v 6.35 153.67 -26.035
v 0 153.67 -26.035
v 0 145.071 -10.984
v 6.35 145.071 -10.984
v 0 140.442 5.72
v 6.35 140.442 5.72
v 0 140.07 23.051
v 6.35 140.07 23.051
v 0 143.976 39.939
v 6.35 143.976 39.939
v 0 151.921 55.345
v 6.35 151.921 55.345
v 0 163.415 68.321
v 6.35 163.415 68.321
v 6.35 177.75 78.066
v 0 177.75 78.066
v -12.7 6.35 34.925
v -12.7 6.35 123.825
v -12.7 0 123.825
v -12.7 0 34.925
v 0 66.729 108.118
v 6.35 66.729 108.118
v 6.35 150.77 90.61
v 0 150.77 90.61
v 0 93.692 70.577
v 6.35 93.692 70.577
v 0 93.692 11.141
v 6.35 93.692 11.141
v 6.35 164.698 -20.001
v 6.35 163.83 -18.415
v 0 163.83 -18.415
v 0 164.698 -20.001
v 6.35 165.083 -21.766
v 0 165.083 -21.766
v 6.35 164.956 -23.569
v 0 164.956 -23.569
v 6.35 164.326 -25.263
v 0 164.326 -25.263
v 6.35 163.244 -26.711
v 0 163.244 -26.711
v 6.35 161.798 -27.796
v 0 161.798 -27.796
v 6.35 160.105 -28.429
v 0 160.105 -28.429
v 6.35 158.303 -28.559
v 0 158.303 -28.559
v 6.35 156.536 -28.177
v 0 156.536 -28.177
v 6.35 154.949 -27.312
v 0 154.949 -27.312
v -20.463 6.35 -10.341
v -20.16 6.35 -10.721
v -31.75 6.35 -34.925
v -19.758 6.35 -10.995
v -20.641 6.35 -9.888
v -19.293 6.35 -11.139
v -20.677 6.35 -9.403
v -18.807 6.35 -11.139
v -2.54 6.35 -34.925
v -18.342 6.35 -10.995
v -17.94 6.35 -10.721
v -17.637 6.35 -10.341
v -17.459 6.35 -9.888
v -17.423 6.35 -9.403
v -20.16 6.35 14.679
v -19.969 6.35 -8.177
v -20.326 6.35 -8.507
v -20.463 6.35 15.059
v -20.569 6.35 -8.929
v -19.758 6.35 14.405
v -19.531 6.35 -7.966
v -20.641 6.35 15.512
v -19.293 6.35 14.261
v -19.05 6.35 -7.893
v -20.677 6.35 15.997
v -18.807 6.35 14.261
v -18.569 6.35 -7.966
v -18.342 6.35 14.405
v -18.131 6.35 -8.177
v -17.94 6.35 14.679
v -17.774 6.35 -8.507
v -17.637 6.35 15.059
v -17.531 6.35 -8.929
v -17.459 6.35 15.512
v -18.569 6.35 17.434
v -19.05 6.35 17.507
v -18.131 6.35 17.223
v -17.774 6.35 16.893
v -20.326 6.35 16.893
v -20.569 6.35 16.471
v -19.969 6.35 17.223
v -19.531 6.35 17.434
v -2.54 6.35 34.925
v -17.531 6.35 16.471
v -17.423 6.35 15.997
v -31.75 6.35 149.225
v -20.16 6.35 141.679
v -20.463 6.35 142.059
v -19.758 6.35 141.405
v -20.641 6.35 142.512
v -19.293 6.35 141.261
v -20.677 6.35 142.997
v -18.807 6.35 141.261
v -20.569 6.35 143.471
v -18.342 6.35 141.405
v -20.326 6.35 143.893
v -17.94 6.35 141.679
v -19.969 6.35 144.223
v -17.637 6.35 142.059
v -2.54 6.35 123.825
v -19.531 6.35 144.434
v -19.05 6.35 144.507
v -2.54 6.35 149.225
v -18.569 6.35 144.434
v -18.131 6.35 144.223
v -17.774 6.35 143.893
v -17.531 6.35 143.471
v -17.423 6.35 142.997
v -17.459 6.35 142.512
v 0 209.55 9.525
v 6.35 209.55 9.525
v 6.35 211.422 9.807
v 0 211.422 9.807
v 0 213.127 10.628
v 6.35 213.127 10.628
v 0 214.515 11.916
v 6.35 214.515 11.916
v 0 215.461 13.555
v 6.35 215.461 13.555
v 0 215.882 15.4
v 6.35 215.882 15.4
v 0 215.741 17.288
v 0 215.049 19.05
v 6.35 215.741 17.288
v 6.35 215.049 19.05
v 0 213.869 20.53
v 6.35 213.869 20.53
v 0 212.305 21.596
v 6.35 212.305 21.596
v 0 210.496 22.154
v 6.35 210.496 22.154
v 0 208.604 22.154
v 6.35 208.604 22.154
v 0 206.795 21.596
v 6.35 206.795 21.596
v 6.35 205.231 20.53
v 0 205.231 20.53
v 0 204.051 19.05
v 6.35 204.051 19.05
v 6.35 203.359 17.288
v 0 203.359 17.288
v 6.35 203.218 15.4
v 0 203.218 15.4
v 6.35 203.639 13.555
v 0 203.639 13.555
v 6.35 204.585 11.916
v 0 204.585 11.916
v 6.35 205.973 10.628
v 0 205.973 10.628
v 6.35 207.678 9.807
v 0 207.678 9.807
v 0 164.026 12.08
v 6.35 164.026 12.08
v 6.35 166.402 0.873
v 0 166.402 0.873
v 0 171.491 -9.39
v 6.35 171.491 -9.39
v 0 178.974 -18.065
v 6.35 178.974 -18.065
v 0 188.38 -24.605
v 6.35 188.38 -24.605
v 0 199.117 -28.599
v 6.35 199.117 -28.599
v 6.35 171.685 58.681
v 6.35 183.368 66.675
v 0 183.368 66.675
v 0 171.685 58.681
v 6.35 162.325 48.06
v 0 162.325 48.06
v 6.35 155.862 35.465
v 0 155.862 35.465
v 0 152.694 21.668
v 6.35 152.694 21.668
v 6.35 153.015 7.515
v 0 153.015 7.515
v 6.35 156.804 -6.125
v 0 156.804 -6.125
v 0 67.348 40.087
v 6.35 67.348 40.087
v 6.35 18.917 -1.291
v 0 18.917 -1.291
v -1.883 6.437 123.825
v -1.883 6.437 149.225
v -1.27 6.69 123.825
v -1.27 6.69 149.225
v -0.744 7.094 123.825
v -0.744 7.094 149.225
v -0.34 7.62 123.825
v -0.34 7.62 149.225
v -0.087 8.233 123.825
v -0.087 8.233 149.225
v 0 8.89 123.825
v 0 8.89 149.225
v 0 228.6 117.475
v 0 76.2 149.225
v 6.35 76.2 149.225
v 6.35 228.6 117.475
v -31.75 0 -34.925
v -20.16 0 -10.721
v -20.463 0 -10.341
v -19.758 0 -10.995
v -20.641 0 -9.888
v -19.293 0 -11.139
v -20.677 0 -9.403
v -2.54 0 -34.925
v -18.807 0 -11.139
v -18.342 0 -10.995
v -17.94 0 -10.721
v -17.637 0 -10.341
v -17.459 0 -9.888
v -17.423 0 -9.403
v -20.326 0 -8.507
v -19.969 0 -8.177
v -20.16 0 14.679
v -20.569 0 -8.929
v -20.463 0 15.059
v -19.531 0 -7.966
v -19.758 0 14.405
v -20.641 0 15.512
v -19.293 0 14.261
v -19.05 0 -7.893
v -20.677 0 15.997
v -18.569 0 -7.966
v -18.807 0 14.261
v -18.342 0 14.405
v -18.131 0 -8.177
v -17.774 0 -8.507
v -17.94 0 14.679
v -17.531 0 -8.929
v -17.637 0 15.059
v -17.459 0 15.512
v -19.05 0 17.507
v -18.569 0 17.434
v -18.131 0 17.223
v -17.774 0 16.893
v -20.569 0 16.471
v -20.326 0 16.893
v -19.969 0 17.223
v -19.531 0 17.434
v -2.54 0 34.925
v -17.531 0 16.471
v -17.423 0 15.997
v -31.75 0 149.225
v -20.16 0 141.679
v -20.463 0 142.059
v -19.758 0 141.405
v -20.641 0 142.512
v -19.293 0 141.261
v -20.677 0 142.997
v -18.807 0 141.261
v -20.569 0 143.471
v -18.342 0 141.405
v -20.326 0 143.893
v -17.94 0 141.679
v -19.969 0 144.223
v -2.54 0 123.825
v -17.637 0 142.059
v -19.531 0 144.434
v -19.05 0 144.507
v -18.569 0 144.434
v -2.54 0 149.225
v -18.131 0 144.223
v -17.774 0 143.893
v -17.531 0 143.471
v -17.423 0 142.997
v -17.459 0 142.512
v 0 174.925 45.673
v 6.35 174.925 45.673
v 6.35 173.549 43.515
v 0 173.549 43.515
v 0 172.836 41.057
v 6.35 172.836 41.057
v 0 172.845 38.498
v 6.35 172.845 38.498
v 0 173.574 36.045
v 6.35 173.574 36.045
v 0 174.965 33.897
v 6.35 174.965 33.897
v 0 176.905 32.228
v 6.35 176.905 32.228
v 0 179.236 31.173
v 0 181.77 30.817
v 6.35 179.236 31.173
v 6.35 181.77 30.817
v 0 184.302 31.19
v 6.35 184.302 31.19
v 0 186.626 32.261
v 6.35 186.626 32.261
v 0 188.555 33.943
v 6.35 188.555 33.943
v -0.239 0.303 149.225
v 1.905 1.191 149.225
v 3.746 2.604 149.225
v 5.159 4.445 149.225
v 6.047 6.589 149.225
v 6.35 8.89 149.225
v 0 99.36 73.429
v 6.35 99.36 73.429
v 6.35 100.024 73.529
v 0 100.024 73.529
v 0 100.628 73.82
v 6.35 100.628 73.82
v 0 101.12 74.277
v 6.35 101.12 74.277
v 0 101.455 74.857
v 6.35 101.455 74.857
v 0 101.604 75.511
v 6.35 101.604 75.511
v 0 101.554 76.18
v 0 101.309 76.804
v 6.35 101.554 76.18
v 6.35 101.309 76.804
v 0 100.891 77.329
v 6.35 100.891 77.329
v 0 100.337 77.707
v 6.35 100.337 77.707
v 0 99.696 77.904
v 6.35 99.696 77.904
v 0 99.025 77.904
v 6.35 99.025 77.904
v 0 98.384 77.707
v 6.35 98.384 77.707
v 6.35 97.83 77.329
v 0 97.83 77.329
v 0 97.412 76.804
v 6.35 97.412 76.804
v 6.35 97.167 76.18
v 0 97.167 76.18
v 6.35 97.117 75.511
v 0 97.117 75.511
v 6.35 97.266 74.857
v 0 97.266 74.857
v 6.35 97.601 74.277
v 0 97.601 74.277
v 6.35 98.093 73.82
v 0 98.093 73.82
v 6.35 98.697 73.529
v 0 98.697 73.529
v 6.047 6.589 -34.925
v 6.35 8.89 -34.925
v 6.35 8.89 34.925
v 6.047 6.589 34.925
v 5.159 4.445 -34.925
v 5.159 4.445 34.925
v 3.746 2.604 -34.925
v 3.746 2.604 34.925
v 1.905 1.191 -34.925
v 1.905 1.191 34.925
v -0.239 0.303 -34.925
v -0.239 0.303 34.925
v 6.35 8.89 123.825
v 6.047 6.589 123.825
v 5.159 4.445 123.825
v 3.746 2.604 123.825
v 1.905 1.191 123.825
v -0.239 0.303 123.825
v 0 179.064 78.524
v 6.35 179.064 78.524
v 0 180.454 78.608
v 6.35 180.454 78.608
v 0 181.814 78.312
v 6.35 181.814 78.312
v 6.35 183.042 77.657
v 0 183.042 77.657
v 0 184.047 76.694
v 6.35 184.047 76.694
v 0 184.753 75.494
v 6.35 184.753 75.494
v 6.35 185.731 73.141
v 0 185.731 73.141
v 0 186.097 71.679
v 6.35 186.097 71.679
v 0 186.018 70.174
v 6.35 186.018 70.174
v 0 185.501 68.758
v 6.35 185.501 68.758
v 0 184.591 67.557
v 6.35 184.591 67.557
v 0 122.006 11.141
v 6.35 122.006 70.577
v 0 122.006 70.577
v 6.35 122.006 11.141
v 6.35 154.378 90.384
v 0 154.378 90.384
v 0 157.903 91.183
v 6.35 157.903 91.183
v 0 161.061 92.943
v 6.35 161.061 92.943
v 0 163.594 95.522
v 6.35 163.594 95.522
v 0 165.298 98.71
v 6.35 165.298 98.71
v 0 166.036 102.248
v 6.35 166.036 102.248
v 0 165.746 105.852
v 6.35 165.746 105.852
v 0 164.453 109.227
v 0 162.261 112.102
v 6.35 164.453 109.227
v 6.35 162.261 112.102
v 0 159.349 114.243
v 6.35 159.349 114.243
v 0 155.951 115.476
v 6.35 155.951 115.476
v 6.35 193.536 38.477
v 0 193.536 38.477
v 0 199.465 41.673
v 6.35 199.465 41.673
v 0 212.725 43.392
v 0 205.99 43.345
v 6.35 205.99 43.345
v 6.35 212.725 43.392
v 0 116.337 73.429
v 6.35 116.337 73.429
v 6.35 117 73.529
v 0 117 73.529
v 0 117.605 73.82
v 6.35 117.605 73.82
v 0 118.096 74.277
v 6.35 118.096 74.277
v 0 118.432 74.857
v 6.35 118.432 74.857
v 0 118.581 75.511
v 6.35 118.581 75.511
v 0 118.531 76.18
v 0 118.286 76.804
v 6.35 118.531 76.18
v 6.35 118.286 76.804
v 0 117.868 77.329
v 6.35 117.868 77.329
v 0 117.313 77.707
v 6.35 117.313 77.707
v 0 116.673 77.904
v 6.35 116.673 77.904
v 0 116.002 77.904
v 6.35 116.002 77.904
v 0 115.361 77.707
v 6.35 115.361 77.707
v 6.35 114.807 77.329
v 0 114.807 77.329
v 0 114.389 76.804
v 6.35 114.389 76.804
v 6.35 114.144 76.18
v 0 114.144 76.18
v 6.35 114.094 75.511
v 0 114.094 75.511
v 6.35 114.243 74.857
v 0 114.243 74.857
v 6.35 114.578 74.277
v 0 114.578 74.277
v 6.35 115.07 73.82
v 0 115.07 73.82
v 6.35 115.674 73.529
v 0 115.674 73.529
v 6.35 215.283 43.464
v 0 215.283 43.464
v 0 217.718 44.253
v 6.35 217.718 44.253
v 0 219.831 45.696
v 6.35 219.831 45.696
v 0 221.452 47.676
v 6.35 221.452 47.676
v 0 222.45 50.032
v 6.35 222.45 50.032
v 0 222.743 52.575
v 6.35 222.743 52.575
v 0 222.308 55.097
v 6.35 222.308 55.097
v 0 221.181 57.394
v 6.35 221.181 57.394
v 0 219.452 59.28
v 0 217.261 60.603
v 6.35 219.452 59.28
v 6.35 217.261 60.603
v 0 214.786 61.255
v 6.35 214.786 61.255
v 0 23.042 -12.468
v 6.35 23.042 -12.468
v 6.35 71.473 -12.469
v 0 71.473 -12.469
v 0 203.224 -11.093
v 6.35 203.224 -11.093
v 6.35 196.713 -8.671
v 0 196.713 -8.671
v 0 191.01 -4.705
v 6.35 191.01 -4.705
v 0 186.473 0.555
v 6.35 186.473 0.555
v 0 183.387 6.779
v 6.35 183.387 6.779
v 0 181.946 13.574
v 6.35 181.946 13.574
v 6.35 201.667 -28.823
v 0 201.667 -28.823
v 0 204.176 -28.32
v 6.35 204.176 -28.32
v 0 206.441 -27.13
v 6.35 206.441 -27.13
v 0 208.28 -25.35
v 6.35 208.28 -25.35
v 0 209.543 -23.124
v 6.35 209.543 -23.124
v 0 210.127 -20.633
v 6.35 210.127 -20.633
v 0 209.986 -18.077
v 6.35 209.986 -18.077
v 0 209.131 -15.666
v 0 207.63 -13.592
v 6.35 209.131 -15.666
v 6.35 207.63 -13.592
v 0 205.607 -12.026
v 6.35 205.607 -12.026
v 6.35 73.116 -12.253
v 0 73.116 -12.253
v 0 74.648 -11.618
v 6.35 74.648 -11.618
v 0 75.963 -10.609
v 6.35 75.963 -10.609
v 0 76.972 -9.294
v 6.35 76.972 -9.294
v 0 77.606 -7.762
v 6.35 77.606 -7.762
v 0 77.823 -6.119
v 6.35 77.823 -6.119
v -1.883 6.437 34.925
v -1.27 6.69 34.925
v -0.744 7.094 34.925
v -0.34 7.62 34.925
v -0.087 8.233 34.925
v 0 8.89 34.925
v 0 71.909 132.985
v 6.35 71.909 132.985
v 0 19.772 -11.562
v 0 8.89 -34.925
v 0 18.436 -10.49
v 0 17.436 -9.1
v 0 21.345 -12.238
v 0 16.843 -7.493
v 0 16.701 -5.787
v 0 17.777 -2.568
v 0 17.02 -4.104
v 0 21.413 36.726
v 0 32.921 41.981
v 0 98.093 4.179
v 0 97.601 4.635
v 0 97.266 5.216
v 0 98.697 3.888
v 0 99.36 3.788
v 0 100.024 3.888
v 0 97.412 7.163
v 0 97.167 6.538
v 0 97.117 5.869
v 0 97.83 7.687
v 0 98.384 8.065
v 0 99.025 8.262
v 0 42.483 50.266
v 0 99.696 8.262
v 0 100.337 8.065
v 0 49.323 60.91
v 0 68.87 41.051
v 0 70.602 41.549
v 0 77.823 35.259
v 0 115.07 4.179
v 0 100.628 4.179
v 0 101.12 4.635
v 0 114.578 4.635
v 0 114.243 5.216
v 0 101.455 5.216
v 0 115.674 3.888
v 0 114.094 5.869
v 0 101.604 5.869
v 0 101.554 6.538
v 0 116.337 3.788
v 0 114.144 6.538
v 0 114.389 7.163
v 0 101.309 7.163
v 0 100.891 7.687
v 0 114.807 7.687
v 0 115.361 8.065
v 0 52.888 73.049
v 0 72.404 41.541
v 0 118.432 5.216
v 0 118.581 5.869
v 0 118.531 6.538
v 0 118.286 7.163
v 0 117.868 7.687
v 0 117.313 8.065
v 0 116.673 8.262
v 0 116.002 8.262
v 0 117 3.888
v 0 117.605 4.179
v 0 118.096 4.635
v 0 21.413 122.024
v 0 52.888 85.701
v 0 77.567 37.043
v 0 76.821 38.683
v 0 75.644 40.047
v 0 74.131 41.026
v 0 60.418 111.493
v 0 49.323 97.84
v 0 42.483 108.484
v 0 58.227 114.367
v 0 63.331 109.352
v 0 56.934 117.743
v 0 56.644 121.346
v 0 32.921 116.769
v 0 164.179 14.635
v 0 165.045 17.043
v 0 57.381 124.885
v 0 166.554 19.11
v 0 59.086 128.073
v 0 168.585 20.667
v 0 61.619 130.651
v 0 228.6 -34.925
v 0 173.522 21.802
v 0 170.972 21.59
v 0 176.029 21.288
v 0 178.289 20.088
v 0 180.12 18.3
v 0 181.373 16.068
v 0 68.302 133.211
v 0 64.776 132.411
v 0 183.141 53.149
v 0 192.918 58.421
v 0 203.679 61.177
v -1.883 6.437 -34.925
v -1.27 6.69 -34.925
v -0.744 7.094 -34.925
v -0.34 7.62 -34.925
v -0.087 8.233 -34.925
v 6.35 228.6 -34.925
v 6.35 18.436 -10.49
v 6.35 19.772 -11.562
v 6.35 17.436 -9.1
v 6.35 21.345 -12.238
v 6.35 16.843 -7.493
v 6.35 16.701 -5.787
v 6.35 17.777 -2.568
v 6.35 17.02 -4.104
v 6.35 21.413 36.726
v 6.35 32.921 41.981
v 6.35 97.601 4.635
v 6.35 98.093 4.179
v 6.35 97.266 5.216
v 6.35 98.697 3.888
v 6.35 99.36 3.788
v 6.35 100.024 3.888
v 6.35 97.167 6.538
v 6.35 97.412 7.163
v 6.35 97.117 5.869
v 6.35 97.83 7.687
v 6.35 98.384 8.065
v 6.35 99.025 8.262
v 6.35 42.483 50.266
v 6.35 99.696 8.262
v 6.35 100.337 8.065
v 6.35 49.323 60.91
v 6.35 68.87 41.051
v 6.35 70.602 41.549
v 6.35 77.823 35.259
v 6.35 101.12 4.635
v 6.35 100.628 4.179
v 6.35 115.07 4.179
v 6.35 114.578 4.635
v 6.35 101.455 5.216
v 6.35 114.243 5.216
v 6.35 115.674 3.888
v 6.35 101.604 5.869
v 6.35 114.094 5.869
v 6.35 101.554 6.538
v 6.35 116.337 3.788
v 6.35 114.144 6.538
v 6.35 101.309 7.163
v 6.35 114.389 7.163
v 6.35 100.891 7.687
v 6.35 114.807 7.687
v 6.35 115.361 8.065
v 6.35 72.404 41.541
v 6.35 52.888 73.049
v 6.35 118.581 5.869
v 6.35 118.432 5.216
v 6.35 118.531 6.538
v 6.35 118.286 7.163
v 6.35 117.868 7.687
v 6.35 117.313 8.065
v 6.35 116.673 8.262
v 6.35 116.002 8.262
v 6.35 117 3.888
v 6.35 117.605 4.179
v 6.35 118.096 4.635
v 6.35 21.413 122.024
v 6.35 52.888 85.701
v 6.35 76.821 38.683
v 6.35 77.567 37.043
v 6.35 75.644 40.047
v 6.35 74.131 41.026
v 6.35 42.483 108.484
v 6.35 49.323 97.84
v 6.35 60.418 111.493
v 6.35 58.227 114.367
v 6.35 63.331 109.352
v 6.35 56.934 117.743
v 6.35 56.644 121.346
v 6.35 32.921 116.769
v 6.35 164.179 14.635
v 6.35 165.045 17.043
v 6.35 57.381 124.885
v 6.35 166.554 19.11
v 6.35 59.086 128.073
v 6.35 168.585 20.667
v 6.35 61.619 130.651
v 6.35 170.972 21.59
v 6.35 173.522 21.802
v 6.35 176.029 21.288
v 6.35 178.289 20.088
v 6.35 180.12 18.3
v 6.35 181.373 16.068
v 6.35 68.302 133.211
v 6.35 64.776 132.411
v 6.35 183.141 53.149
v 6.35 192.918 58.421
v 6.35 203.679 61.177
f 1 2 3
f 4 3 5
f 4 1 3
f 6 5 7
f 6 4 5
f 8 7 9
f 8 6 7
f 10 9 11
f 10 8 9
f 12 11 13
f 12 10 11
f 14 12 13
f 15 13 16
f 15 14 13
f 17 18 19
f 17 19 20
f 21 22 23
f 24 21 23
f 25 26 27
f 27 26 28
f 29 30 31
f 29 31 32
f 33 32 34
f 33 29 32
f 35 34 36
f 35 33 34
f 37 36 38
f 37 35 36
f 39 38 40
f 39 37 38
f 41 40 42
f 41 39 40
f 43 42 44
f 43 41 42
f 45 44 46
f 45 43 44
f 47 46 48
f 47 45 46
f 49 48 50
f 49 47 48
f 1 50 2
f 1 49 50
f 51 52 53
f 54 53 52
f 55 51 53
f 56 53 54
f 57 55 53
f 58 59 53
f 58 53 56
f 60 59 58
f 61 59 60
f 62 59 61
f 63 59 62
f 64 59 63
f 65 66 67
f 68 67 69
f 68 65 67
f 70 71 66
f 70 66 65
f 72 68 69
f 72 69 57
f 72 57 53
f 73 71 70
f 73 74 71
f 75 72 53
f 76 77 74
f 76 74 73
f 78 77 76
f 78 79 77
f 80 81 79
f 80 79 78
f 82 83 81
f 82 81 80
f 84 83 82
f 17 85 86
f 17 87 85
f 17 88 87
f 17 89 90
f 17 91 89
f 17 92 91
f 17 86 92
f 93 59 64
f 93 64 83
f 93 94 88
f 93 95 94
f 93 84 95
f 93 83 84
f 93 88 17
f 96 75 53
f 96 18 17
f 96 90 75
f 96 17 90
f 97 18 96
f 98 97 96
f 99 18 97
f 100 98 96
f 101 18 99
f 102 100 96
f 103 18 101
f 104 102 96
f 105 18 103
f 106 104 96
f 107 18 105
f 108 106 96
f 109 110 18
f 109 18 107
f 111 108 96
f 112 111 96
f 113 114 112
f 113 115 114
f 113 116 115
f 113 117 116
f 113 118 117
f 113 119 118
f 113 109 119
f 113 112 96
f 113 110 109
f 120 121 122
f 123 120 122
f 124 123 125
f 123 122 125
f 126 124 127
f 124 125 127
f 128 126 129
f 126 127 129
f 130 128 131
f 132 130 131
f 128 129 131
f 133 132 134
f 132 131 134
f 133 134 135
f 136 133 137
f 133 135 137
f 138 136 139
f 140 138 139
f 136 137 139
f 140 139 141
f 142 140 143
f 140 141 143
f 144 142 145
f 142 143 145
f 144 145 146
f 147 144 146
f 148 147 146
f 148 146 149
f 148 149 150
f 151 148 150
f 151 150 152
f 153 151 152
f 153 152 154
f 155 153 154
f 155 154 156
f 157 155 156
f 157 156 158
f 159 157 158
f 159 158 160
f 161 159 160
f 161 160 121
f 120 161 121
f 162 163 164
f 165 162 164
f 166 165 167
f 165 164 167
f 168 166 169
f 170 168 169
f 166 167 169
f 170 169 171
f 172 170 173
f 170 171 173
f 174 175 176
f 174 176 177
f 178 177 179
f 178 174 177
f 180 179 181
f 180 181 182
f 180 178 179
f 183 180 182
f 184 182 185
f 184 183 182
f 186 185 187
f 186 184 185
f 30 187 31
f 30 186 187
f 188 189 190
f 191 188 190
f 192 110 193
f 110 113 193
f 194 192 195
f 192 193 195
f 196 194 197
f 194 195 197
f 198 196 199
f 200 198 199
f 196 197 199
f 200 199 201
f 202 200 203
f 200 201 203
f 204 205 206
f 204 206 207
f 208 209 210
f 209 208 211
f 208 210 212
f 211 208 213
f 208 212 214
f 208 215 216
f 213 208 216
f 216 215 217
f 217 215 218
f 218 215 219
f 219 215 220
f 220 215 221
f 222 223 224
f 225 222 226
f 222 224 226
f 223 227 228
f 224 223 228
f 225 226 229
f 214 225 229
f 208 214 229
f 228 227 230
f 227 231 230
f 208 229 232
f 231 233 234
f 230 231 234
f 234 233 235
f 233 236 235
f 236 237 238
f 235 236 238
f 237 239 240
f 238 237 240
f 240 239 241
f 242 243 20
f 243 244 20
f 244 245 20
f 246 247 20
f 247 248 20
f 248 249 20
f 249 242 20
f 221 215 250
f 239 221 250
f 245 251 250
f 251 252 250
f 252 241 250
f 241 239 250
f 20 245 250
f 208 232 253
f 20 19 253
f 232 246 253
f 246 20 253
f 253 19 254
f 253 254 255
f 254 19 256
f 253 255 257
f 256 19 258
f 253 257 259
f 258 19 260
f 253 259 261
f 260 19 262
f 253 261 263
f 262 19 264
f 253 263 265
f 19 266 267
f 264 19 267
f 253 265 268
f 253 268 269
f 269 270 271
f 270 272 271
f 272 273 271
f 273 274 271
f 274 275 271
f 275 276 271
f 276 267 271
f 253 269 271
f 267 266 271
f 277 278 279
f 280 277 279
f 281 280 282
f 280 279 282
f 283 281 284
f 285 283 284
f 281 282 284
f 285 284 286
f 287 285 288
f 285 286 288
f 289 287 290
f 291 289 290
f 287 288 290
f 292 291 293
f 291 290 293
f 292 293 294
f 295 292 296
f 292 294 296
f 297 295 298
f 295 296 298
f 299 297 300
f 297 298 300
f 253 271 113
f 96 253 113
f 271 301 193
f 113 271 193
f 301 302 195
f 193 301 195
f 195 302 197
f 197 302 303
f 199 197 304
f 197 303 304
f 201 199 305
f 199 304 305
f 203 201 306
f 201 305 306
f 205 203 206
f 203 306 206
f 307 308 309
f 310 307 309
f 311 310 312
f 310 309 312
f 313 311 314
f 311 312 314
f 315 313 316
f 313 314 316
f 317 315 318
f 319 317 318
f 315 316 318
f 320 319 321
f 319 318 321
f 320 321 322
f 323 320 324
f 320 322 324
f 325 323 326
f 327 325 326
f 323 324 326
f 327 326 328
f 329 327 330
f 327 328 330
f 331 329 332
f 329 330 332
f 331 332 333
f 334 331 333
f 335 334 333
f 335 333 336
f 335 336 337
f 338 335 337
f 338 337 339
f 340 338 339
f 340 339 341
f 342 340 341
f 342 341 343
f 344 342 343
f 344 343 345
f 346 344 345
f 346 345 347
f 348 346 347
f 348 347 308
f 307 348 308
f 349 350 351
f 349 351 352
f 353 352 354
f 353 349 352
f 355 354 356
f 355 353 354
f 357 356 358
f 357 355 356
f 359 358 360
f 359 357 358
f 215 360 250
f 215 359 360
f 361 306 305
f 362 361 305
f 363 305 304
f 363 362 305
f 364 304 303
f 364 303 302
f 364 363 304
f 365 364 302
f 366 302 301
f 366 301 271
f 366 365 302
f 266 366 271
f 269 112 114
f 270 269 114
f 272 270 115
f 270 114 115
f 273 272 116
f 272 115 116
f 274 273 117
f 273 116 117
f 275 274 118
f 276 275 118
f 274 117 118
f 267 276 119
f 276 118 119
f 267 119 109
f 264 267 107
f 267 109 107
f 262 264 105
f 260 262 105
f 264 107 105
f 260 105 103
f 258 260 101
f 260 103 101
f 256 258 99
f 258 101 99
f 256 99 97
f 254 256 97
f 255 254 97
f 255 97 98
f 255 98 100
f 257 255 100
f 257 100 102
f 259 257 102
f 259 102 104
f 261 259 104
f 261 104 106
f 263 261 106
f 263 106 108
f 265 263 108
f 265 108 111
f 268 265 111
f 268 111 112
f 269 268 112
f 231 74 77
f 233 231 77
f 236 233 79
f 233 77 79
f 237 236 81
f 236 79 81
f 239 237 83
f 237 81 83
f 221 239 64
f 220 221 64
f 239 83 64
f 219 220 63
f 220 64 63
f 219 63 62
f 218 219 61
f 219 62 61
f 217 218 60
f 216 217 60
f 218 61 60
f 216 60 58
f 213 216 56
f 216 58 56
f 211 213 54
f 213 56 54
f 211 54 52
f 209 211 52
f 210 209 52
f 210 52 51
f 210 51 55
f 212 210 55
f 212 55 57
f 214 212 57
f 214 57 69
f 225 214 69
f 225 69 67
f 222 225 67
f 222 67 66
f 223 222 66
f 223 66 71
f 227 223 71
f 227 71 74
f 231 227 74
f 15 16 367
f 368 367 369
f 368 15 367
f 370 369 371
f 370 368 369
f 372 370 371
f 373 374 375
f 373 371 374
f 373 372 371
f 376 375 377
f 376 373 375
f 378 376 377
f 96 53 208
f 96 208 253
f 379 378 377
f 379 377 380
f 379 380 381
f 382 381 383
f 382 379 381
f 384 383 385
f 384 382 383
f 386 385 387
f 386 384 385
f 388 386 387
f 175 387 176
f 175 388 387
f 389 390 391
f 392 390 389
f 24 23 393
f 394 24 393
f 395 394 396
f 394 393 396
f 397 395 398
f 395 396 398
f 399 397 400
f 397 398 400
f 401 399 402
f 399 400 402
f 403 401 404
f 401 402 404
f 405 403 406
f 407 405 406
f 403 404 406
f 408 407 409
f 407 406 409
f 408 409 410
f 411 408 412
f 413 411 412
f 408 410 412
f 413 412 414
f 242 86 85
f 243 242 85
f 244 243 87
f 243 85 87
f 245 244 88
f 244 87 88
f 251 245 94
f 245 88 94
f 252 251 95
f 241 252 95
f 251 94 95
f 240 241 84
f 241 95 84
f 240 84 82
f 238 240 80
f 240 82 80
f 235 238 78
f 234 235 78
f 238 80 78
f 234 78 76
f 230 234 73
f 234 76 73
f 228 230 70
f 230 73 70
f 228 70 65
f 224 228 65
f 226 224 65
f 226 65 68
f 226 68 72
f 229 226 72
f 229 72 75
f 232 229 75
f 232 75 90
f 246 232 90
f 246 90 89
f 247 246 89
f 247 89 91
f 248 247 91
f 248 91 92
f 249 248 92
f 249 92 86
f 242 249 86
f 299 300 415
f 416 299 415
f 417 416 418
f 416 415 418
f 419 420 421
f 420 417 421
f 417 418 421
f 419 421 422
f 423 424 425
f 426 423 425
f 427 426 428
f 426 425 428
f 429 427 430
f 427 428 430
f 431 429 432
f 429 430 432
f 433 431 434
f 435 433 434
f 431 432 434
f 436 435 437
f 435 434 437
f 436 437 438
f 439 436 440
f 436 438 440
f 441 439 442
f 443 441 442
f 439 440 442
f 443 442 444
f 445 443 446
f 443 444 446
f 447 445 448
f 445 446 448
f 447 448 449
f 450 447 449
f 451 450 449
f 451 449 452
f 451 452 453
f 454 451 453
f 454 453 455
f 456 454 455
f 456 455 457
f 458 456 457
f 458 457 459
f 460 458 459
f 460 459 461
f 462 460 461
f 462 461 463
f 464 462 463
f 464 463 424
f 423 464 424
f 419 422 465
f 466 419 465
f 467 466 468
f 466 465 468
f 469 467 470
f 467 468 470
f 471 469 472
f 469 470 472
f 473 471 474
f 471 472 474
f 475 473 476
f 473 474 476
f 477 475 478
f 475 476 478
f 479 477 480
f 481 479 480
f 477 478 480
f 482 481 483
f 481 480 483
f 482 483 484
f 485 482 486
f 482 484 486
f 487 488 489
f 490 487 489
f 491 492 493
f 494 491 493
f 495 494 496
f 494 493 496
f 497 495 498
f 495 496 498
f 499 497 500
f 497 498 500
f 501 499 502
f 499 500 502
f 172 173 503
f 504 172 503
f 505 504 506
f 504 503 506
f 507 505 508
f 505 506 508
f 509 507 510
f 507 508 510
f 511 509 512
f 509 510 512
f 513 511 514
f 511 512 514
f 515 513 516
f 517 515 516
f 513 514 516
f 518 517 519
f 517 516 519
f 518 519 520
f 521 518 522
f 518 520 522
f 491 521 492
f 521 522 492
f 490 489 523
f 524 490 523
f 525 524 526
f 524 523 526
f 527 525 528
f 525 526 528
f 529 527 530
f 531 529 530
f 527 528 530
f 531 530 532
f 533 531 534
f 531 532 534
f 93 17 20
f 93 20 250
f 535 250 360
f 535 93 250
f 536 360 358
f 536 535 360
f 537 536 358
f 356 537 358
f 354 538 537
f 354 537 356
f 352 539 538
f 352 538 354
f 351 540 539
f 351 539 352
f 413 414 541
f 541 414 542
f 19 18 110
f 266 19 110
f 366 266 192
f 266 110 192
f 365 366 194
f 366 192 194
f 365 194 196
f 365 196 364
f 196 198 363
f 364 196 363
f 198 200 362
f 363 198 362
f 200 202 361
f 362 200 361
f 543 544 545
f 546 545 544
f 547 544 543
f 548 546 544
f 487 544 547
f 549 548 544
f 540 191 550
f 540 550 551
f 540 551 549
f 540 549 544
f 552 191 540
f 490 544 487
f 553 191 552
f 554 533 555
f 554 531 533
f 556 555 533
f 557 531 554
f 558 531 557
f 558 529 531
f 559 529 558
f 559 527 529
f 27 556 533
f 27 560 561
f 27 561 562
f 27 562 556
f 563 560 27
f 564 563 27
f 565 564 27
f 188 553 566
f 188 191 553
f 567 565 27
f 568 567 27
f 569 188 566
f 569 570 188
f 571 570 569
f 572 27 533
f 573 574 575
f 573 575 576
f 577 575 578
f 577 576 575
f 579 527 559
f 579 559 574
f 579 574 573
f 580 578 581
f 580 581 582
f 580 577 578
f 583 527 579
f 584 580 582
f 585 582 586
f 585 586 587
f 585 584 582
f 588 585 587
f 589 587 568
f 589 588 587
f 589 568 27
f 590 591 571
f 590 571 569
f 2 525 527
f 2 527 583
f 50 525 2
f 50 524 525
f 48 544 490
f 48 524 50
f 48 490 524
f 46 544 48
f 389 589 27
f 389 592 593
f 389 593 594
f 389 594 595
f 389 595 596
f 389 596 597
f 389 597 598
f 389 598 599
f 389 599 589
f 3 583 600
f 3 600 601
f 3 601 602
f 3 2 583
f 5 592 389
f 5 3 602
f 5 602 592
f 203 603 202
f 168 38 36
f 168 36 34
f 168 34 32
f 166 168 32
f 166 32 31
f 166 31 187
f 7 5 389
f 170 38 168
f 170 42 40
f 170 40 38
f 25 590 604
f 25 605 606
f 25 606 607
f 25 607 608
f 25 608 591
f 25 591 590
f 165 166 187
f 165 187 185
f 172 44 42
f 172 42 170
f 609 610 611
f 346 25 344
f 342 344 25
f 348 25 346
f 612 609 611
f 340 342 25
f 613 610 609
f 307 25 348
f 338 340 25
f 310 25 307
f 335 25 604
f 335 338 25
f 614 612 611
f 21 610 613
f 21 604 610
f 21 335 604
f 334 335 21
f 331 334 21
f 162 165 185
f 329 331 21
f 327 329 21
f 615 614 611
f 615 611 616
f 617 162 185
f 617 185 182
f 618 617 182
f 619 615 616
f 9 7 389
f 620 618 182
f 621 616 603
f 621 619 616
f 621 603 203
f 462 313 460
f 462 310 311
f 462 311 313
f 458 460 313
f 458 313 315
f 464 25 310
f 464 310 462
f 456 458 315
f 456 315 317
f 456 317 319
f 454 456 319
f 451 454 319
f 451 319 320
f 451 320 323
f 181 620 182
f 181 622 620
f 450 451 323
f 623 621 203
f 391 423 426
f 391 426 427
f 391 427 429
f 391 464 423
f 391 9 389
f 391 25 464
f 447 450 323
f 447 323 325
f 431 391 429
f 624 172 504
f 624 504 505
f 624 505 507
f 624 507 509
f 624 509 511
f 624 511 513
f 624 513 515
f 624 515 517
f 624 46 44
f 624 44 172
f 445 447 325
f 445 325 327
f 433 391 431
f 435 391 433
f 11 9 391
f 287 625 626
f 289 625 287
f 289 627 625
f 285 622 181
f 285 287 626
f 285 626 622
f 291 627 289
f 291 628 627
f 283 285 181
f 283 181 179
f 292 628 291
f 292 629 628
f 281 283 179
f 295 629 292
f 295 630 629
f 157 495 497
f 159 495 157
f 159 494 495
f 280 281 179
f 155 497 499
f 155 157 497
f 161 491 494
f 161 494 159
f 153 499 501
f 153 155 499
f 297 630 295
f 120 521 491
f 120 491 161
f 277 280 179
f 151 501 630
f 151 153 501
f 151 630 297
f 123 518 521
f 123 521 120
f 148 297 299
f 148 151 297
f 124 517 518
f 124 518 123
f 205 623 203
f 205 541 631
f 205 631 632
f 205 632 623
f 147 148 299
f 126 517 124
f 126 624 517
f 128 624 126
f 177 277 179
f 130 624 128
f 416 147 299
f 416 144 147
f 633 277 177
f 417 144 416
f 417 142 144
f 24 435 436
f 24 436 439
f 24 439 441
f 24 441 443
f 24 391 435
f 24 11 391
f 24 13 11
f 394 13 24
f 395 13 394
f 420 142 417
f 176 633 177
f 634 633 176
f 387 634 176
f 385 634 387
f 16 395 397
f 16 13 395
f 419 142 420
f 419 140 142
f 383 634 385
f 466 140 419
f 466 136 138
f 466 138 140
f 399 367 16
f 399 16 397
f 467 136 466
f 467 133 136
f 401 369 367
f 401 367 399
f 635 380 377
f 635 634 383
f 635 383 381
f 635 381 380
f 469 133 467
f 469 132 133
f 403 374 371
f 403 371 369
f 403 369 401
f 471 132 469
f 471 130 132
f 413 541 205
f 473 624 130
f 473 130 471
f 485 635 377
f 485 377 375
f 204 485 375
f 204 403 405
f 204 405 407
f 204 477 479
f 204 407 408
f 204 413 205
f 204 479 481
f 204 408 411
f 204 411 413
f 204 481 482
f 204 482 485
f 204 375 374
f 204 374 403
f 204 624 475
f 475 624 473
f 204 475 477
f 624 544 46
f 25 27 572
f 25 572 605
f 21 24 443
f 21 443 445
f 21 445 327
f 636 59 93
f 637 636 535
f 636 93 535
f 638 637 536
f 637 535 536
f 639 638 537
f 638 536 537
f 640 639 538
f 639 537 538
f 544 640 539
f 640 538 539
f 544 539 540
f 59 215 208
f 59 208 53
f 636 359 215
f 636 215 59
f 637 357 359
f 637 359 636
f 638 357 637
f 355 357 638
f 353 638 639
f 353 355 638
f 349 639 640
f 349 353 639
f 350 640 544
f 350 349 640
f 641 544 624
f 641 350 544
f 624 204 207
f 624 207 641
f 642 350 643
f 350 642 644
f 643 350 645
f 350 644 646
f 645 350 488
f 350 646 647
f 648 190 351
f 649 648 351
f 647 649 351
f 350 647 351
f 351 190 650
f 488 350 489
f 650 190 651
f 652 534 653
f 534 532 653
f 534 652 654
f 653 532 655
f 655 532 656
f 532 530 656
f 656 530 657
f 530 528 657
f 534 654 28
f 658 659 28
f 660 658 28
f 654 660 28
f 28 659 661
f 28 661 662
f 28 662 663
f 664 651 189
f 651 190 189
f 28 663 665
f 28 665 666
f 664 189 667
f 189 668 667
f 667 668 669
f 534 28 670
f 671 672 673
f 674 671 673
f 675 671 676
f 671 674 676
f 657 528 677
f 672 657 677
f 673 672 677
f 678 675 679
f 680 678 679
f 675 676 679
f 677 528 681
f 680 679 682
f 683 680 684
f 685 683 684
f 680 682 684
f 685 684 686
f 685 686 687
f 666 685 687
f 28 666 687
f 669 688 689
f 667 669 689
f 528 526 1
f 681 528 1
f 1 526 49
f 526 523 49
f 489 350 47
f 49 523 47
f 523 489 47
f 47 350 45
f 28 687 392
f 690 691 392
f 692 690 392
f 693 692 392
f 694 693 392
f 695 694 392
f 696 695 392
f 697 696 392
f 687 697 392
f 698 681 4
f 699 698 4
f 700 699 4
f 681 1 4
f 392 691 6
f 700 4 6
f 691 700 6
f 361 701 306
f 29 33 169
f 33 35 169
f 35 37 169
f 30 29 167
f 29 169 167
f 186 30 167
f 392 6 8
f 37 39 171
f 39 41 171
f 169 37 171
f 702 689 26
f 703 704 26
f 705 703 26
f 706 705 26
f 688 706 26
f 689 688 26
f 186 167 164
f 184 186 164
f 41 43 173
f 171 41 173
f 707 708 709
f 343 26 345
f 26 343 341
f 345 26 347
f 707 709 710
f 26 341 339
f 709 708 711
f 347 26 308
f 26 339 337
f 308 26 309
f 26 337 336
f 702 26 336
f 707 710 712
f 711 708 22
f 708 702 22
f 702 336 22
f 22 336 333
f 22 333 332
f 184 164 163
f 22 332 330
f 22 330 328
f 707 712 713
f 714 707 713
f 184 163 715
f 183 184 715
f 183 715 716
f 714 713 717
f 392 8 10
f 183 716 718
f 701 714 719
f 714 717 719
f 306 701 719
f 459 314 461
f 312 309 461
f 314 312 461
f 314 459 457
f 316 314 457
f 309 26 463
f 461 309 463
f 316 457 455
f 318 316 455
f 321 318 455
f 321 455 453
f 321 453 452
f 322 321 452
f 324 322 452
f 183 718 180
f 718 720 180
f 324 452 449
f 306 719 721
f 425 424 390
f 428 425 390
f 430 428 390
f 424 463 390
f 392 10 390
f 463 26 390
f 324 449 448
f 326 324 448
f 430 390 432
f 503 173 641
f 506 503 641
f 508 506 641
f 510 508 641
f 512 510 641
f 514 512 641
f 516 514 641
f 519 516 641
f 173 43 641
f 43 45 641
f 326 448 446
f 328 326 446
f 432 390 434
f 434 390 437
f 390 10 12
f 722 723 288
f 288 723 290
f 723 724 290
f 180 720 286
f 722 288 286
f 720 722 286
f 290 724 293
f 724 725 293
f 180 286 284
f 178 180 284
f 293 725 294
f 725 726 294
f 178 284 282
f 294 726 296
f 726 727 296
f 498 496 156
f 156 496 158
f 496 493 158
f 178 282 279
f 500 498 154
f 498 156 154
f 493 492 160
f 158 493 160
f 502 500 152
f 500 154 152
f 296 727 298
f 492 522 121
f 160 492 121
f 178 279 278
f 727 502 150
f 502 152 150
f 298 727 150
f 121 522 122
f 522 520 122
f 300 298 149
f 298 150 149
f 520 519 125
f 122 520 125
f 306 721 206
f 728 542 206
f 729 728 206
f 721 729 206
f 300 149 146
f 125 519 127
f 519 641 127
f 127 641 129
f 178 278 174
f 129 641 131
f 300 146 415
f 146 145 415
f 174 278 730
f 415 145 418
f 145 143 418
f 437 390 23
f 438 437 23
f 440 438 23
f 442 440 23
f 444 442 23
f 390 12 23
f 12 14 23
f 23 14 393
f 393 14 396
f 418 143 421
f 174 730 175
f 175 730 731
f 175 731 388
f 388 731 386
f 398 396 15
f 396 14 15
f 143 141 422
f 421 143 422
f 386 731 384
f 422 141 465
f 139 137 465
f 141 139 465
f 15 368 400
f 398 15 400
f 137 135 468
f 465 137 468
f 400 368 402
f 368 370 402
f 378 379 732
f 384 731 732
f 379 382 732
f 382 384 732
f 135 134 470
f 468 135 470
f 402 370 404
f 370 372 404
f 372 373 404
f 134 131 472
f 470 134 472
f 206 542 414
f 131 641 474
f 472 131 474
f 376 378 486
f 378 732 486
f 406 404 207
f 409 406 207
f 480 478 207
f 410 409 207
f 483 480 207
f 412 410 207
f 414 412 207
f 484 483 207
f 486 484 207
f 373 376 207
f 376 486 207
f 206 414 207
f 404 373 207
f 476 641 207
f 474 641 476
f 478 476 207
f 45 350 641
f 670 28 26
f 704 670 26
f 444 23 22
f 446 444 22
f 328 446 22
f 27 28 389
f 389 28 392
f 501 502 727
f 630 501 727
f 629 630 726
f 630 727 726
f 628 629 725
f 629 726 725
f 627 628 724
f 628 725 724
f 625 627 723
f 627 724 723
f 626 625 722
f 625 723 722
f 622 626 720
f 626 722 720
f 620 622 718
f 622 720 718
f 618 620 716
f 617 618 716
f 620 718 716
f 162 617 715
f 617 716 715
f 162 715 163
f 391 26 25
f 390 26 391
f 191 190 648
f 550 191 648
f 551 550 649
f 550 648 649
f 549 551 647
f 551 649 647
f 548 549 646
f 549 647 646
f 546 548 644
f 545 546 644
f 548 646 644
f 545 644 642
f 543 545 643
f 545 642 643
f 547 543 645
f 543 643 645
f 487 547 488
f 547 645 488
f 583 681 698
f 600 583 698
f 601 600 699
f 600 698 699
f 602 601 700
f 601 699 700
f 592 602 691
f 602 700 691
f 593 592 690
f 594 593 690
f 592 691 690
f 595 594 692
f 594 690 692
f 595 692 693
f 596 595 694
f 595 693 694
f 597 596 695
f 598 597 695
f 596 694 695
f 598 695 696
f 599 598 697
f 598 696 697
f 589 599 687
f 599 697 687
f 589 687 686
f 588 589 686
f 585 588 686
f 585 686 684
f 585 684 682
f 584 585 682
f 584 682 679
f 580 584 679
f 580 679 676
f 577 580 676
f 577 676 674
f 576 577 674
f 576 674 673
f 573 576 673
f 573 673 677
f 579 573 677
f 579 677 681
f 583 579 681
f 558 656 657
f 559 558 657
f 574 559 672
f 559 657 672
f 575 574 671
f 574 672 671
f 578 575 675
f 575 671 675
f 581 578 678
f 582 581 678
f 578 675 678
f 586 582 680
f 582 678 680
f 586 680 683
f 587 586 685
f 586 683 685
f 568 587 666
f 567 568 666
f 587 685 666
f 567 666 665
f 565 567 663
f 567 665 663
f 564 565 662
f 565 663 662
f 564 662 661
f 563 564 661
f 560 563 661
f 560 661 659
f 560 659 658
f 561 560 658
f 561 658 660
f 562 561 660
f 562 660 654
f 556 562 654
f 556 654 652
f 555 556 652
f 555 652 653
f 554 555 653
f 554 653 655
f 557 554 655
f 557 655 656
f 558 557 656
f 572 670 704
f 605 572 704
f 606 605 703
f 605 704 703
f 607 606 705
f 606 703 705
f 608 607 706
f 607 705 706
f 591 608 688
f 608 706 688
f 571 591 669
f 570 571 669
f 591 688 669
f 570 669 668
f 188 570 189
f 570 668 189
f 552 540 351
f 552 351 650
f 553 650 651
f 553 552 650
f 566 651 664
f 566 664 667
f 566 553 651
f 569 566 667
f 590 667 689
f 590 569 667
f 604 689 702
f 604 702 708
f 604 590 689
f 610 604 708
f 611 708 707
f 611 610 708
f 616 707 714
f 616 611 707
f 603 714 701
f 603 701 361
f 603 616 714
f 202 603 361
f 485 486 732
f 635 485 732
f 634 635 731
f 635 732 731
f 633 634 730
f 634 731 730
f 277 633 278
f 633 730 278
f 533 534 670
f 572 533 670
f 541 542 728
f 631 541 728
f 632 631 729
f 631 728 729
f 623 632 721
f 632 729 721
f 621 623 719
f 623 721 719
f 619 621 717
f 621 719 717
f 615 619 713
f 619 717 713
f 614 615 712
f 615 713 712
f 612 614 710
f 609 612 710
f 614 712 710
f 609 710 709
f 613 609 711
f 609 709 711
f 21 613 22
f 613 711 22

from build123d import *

# Parameters (mm, degrees)
BOSS_EXTRUDE1_DEPTH  = 6.35
SKETCH5_W            = 184.15
SKETCH5_H            = 6.35
BOSS_EXTRUDE4_DEPTH  = 31.75
SKETCH6_W            = 12.7
SKETCH6_H            = 88.9
CUT_EXTRUDE2_DEPTH   = 270.576010849
CUT_EXTRUDE3_REACH   = 277.64
SKETCH7_R            = 2.25
SKETCH7_W            = 59.436
SKETCH7_H            = 28.313784743
SKETCH8_R            = 6.35
CUT_EXTRUDE4_DEPTH   = 276.640473489
FILLET1_R            = 2.54
CONVERT_SOLID1_START = -34.925
CONVERT_SOLID1_DEPTH = 184.15
CUT_EXTRUDE5_REACH   = 277.64
CUT_EXTRUDE6_REACH   = 271.576
SKETCH10_R           = 1.63195


# Read off the part's stored shape, not the designer's step: Convert-Solid1
with BuildPart() as part:
    # Sketch1 → Boss-Extrude1 (new body)
    with BuildSketch(Plane(origin=(0, 0, 0), x_dir=(0, 0, -1), z_dir=(1, 0, 0))):
        with BuildLine():
            Line((-117.475, 228.6), (34.925, 228.6))
            Line((34.925, 228.6), (34.925, 8.89))
            Line((34.925, 8.89), (34.925, 0))
            Line((34.925, 0), (-34.925, 0))
            Line((-34.925, 0), (-34.925, 8.89))
            ThreePointArc((-34.925, 8.89), (-79.375, 53.34), (-123.825, 8.89))
            Line((-123.825, 8.89), (-123.825, 0))
            Line((-123.825, 0), (-149.225, 0))
            Line((-149.225, 0), (-149.225, 76.2))
            Line((-149.225, 76.2), (-117.475, 228.6))
        make_face()
    extrude(amount=BOSS_EXTRUDE1_DEPTH)

    # Sketch5 → Boss-Extrude4 (add)
    with BuildSketch(Plane.ZY):
        with Locations((57.15, 3.175)):
            Rectangle(SKETCH5_W, SKETCH5_H)
    extrude(amount=BOSS_EXTRUDE4_DEPTH)

    # Sketch6 → Cut-Extrude2 (cut, through all)
    with BuildSketch(Plane(origin=(0, 6.35, 0), x_dir=(1, 0, 0), z_dir=(0, 1, 0))):
        with Locations((-6.35, -79.375)):
            Rectangle(SKETCH6_W, SKETCH6_H)
    extrude(amount=-CUT_EXTRUDE2_DEPTH, mode=Mode.SUBTRACT)

    # Sketch7 → Cut-Extrude3 (cut, up to next)
    with BuildSketch(Plane(origin=(6.35, 0, 0), x_dir=(0, 0, -1), z_dir=(1, 0, 0)), mode=Mode.PRIVATE) as cut_extrude3_sk1:
        with Locations((-75.679460058, 116.337237118)):
            Circle(SKETCH7_R)
    cut_extrude3_tool1 = extrude(cut_extrude3_sk1.sketch, amount=-CUT_EXTRUDE3_REACH, mode=Mode.PRIVATE) & part.part
    # Sketch7 → Cut-Extrude3 (cut, up to next)
    with BuildSketch(Plane(origin=(6.35, 0, 0), x_dir=(0, 0, -1), z_dir=(1, 0, 0)), mode=Mode.PRIVATE) as cut_extrude3_sk2:
        with Locations((-75.679460058, 99.360389657)):
            Circle(SKETCH7_R)
    cut_extrude3_tool2 = extrude(cut_extrude3_sk2.sketch, amount=-CUT_EXTRUDE3_REACH, mode=Mode.PRIVATE) & part.part
    # Sketch7 → Cut-Extrude3 (cut, up to next)
    with BuildSketch(Plane(origin=(6.35, 0, 0), x_dir=(0, 0, -1), z_dir=(1, 0, 0)), mode=Mode.PRIVATE) as cut_extrude3_sk3:
        with Locations((-6.03755368, 99.360389657)):
            Circle(SKETCH7_R)
    cut_extrude3_tool3 = extrude(cut_extrude3_sk3.sketch, amount=-CUT_EXTRUDE3_REACH, mode=Mode.PRIVATE) & part.part
    # Sketch7 → Cut-Extrude3 (cut, up to next)
    with BuildSketch(Plane(origin=(6.35, 0, 0), x_dir=(0, 0, -1), z_dir=(1, 0, 0)), mode=Mode.PRIVATE) as cut_extrude3_sk4:
        with Locations((-6.03755368, 116.337237118)):
            Circle(SKETCH7_R)
    cut_extrude3_tool4 = extrude(cut_extrude3_sk4.sketch, amount=-CUT_EXTRUDE3_REACH, mode=Mode.PRIVATE) & part.part
    # Sketch7 → Cut-Extrude3 (cut, up to next)
    with BuildSketch(Plane(origin=(6.35, 0, 0), x_dir=(0, 0, -1), z_dir=(1, 0, 0)), mode=Mode.PRIVATE) as cut_extrude3_sk5:
        with Locations((-40.858506869, 107.848813388)):
            Rectangle(SKETCH7_W, SKETCH7_H)
    cut_extrude3_tool5 = extrude(cut_extrude3_sk5.sketch, amount=-CUT_EXTRUDE3_REACH, mode=Mode.PRIVATE) & part.part
    add(cut_extrude3_tool1.solids().sort_by_distance((6.35, 116.337237, 75.67946))[0], mode=Mode.SUBTRACT)
    add(cut_extrude3_tool2.solids().sort_by_distance((6.35, 99.36039, 75.67946))[0], mode=Mode.SUBTRACT)
    add(cut_extrude3_tool3.solids().sort_by_distance((6.35, 99.36039, 6.037554))[0], mode=Mode.SUBTRACT)
    add(cut_extrude3_tool4.solids().sort_by_distance((6.35, 116.337237, 6.037554))[0], mode=Mode.SUBTRACT)
    add(cut_extrude3_tool5.solids().sort_by_distance((6.35, 107.848813, 40.858507))[0], mode=Mode.SUBTRACT)

    # Sketch8 → Cut-Extrude4 (cut, through all)
    with BuildSketch(Plane(origin=(6.35, 0, 0), x_dir=(0, 0, -1), z_dir=(1, 0, 0))):
        with Locations((-15.875, 209.55)):
            Circle(SKETCH8_R)
    extrude(amount=-CUT_EXTRUDE4_DEPTH, mode=Mode.SUBTRACT)

    # Fillet1
    fillet1_edges = [part.edges().sort_by_distance(p)[0] for p in [
        (0, 6.35, 136.525),
        (0, 6.35, 0),
    ]]
    fillet(fillet1_edges, radius=FILLET1_R)

    # Convert-Solid1 outline → Convert-Solid1 (cut)
    with BuildSketch(Plane.XY.offset(CONVERT_SOLID1_START)):
        with BuildLine():
            ThreePointArc((6.35, 8.89), (3.746179285, 2.603820715), (-2.54, 0))
            Line((-2.54, 0), (6.35, 0))
            Line((6.35, 0), (6.35, 8.89))
        make_face()
    extrude(amount=CONVERT_SOLID1_DEPTH, mode=Mode.SUBTRACT)

    # Sketch9 → Cut-Extrude5 (cut, up to next)
    with BuildSketch(Plane(origin=(6.35, 0, 0), x_dir=(0, 0, -1), z_dir=(1, 0, 0)), mode=Mode.PRIVATE) as cut_extrude5_sk1:
        with BuildLine():
            Line((-75.494212356, 184.752903033), (-73.141435562, 185.731480776))
            ThreePointArc((-73.141435562, 185.731480776), (-69.446832384, 185.812370314), (-66.675, 183.368279277))
            ThreePointArc((-66.675, 183.368279277), (-28.664883279, 153.84953873), (18.415, 163.83))
            ThreePointArc((18.415, 163.83), (27.305, 162.56), (26.035, 153.67))
            ThreePointArc((26.035, 153.67), (-31.616379009, 141.496848075), (-78.066338809, 177.749687467))
            ThreePointArc((-78.066338809, 177.749687467), (-78.311881244, 181.813820193), (-75.494212356, 184.752903033))
        make_face()
    cut_extrude5_tool1 = extrude(cut_extrude5_sk1.sketch, amount=-CUT_EXTRUDE5_REACH, mode=Mode.PRIVATE) & part.part
    # Sketch9 → Cut-Extrude5 (cut, up to next)
    with BuildSketch(Plane(origin=(6.35, 0, 0), x_dir=(0, 0, -1), z_dir=(1, 0, 0)), mode=Mode.PRIVATE) as cut_extrude5_sk2:
        with BuildLine():
            Line((-108.118493719, 66.728864942), (-90.609860799, 150.770302958))
            ThreePointArc((-90.609860799, 150.770302958), (-100.452693102, 165.793573316), (-115.47596346, 155.950741012))
            Line((-115.47596346, 155.950741012), (-132.98459638, 71.909302996))
            ThreePointArc((-132.98459638, 71.909302996), (-123.141764077, 56.886032638), (-108.118493719, 66.728864942))
        make_face()
    cut_extrude5_tool2 = extrude(cut_extrude5_sk2.sketch, amount=-CUT_EXTRUDE5_REACH, mode=Mode.PRIVATE) & part.part
    # Sketch9 → Cut-Extrude5 (cut, up to next)
    with BuildSketch(Plane(origin=(6.35, 0, 0), x_dir=(0, 0, -1), z_dir=(1, 0, 0)), mode=Mode.PRIVATE) as cut_extrude5_sk3:
        with BuildLine():
            Line((-40.087105739, 67.347842772), (1.2905656, 18.917236412))
            ThreePointArc((1.2905656, 18.917236412), (8.316769711, 17.084699632), (12.468452925, 23.041986075))
            Line((12.468452925, 23.041986075), (12.468863596, 71.472592434))
            ThreePointArc((12.468863596, 71.472592434), (10.609010694, 75.962755303), (6.118863596, 77.82264628))
            Line((6.118863596, 77.82264628), (-35.259218414, 77.82264628))
            ThreePointArc((-35.259218414, 77.82264628), (-41.026150106, 74.130652838), (-40.087105739, 67.347842772))
        make_face()
    cut_extrude5_tool3 = extrude(cut_extrude5_sk3.sketch, amount=-CUT_EXTRUDE5_REACH, mode=Mode.PRIVATE) & part.part
    # Sketch9 → Cut-Extrude5 (cut, up to next)
    with BuildSketch(Plane(origin=(6.35, 0, 0), x_dir=(0, 0, -1), z_dir=(1, 0, 0)), mode=Mode.PRIVATE) as cut_extrude5_sk4:
        with BuildLine():
            ThreePointArc((-61.255276679, 214.786351204), (-58.421011662, 192.917929262), (-45.672728213, 174.925091643))
            ThreePointArc((-45.672728213, 174.925091643), (-32.993270754, 175.875161813), (-33.943340924, 188.554619273))
            ThreePointArc((-33.943340924, 188.554619273), (-41.673471553, 199.464871288), (-43.392074603, 212.725147383))
            ThreePointArc((-43.392074603, 212.725147383), (-51.29307373, 222.687350332), (-61.255276679, 214.786351204))
        make_face()
    cut_extrude5_tool4 = extrude(cut_extrude5_sk4.sketch, amount=-CUT_EXTRUDE5_REACH, mode=Mode.PRIVATE) & part.part
    # Sketch9 → Cut-Extrude5 (cut, up to next)
    with BuildSketch(Plane(origin=(6.35, 0, 0), x_dir=(0, 0, -1), z_dir=(1, 0, 0)), mode=Mode.PRIVATE) as cut_extrude5_sk5:
        with BuildLine():
            ThreePointArc((-12.080418407, 164.026489196), (13.963017041, 174.959804504), (28.599113727, 199.117258578))
            ThreePointArc((28.599113727, 199.117258578), (21.899199613, 209.923850348), (11.092607844, 203.223936233))
            ThreePointArc((11.092607844, 203.223936233), (2.217770715, 188.575667985), (-13.574093253, 181.946073037))
            ThreePointArc((-13.574093253, 181.946073037), (-21.787047751, 172.239443693), (-12.080418407, 164.026489196))
        make_face()
    cut_extrude5_tool5 = extrude(cut_extrude5_sk5.sketch, amount=-CUT_EXTRUDE5_REACH, mode=Mode.PRIVATE) & part.part
    add(cut_extrude5_tool1.solids().sort_by_distance((6.35, 181.411079, 77.215324))[0], mode=Mode.SUBTRACT)
    add(cut_extrude5_tool2.solids().sort_by_distance((6.35, 111.339803, 111.797229))[0], mode=Mode.SUBTRACT)
    add(cut_extrude5_tool3.solids().sort_by_distance((6.35, 54.455432, 7.917782))[0], mode=Mode.SUBTRACT)
    add(cut_extrude5_tool4.solids().sort_by_distance((6.35, 197.006846, 47.961274))[0], mode=Mode.SUBTRACT)
    add(cut_extrude5_tool5.solids().sort_by_distance((6.35, 184.385964, -5.831872))[0], mode=Mode.SUBTRACT)

    # Sketch10 → Cut-Extrude6 (cut, up to next)
    with BuildSketch(Plane(origin=(0, 6.35, 0), x_dir=(1, 0, 0), z_dir=(0, 1, 0)), mode=Mode.PRIVATE) as cut_extrude6_sk1:
        with Locations(Location((-19.05, 9.525, 0), (0, 0, 270))):
            Circle(SKETCH10_R)
    cut_extrude6_tool1 = extrude(cut_extrude6_sk1.sketch, amount=-CUT_EXTRUDE6_REACH, mode=Mode.PRIVATE) & part.part
    # Sketch10 → Cut-Extrude6 (cut, up to next)
    with BuildSketch(Plane(origin=(0, 6.35, 0), x_dir=(1, 0, 0), z_dir=(0, 1, 0)), mode=Mode.PRIVATE) as cut_extrude6_sk2:
        with Locations(Location((-19.05, -15.875, 0), (0, 0, 270))):
            Circle(SKETCH10_R)
    cut_extrude6_tool2 = extrude(cut_extrude6_sk2.sketch, amount=-CUT_EXTRUDE6_REACH, mode=Mode.PRIVATE) & part.part
    # Sketch10 → Cut-Extrude6 (cut, up to next)
    with BuildSketch(Plane(origin=(0, 6.35, 0), x_dir=(1, 0, 0), z_dir=(0, 1, 0)), mode=Mode.PRIVATE) as cut_extrude6_sk3:
        with Locations(Location((-19.05, -142.875, 0), (0, 0, 270))):
            Circle(SKETCH10_R)
    cut_extrude6_tool3 = extrude(cut_extrude6_sk3.sketch, amount=-CUT_EXTRUDE6_REACH, mode=Mode.PRIVATE) & part.part
    add(cut_extrude6_tool1.solids().sort_by_distance((-19.05, 6.35, -9.525))[0], mode=Mode.SUBTRACT)
    add(cut_extrude6_tool2.solids().sort_by_distance((-19.05, 6.35, 15.875))[0], mode=Mode.SUBTRACT)
    add(cut_extrude6_tool3.solids().sort_by_distance((-19.05, 6.35, 142.875))[0], mode=Mode.SUBTRACT)


solid = part.part
